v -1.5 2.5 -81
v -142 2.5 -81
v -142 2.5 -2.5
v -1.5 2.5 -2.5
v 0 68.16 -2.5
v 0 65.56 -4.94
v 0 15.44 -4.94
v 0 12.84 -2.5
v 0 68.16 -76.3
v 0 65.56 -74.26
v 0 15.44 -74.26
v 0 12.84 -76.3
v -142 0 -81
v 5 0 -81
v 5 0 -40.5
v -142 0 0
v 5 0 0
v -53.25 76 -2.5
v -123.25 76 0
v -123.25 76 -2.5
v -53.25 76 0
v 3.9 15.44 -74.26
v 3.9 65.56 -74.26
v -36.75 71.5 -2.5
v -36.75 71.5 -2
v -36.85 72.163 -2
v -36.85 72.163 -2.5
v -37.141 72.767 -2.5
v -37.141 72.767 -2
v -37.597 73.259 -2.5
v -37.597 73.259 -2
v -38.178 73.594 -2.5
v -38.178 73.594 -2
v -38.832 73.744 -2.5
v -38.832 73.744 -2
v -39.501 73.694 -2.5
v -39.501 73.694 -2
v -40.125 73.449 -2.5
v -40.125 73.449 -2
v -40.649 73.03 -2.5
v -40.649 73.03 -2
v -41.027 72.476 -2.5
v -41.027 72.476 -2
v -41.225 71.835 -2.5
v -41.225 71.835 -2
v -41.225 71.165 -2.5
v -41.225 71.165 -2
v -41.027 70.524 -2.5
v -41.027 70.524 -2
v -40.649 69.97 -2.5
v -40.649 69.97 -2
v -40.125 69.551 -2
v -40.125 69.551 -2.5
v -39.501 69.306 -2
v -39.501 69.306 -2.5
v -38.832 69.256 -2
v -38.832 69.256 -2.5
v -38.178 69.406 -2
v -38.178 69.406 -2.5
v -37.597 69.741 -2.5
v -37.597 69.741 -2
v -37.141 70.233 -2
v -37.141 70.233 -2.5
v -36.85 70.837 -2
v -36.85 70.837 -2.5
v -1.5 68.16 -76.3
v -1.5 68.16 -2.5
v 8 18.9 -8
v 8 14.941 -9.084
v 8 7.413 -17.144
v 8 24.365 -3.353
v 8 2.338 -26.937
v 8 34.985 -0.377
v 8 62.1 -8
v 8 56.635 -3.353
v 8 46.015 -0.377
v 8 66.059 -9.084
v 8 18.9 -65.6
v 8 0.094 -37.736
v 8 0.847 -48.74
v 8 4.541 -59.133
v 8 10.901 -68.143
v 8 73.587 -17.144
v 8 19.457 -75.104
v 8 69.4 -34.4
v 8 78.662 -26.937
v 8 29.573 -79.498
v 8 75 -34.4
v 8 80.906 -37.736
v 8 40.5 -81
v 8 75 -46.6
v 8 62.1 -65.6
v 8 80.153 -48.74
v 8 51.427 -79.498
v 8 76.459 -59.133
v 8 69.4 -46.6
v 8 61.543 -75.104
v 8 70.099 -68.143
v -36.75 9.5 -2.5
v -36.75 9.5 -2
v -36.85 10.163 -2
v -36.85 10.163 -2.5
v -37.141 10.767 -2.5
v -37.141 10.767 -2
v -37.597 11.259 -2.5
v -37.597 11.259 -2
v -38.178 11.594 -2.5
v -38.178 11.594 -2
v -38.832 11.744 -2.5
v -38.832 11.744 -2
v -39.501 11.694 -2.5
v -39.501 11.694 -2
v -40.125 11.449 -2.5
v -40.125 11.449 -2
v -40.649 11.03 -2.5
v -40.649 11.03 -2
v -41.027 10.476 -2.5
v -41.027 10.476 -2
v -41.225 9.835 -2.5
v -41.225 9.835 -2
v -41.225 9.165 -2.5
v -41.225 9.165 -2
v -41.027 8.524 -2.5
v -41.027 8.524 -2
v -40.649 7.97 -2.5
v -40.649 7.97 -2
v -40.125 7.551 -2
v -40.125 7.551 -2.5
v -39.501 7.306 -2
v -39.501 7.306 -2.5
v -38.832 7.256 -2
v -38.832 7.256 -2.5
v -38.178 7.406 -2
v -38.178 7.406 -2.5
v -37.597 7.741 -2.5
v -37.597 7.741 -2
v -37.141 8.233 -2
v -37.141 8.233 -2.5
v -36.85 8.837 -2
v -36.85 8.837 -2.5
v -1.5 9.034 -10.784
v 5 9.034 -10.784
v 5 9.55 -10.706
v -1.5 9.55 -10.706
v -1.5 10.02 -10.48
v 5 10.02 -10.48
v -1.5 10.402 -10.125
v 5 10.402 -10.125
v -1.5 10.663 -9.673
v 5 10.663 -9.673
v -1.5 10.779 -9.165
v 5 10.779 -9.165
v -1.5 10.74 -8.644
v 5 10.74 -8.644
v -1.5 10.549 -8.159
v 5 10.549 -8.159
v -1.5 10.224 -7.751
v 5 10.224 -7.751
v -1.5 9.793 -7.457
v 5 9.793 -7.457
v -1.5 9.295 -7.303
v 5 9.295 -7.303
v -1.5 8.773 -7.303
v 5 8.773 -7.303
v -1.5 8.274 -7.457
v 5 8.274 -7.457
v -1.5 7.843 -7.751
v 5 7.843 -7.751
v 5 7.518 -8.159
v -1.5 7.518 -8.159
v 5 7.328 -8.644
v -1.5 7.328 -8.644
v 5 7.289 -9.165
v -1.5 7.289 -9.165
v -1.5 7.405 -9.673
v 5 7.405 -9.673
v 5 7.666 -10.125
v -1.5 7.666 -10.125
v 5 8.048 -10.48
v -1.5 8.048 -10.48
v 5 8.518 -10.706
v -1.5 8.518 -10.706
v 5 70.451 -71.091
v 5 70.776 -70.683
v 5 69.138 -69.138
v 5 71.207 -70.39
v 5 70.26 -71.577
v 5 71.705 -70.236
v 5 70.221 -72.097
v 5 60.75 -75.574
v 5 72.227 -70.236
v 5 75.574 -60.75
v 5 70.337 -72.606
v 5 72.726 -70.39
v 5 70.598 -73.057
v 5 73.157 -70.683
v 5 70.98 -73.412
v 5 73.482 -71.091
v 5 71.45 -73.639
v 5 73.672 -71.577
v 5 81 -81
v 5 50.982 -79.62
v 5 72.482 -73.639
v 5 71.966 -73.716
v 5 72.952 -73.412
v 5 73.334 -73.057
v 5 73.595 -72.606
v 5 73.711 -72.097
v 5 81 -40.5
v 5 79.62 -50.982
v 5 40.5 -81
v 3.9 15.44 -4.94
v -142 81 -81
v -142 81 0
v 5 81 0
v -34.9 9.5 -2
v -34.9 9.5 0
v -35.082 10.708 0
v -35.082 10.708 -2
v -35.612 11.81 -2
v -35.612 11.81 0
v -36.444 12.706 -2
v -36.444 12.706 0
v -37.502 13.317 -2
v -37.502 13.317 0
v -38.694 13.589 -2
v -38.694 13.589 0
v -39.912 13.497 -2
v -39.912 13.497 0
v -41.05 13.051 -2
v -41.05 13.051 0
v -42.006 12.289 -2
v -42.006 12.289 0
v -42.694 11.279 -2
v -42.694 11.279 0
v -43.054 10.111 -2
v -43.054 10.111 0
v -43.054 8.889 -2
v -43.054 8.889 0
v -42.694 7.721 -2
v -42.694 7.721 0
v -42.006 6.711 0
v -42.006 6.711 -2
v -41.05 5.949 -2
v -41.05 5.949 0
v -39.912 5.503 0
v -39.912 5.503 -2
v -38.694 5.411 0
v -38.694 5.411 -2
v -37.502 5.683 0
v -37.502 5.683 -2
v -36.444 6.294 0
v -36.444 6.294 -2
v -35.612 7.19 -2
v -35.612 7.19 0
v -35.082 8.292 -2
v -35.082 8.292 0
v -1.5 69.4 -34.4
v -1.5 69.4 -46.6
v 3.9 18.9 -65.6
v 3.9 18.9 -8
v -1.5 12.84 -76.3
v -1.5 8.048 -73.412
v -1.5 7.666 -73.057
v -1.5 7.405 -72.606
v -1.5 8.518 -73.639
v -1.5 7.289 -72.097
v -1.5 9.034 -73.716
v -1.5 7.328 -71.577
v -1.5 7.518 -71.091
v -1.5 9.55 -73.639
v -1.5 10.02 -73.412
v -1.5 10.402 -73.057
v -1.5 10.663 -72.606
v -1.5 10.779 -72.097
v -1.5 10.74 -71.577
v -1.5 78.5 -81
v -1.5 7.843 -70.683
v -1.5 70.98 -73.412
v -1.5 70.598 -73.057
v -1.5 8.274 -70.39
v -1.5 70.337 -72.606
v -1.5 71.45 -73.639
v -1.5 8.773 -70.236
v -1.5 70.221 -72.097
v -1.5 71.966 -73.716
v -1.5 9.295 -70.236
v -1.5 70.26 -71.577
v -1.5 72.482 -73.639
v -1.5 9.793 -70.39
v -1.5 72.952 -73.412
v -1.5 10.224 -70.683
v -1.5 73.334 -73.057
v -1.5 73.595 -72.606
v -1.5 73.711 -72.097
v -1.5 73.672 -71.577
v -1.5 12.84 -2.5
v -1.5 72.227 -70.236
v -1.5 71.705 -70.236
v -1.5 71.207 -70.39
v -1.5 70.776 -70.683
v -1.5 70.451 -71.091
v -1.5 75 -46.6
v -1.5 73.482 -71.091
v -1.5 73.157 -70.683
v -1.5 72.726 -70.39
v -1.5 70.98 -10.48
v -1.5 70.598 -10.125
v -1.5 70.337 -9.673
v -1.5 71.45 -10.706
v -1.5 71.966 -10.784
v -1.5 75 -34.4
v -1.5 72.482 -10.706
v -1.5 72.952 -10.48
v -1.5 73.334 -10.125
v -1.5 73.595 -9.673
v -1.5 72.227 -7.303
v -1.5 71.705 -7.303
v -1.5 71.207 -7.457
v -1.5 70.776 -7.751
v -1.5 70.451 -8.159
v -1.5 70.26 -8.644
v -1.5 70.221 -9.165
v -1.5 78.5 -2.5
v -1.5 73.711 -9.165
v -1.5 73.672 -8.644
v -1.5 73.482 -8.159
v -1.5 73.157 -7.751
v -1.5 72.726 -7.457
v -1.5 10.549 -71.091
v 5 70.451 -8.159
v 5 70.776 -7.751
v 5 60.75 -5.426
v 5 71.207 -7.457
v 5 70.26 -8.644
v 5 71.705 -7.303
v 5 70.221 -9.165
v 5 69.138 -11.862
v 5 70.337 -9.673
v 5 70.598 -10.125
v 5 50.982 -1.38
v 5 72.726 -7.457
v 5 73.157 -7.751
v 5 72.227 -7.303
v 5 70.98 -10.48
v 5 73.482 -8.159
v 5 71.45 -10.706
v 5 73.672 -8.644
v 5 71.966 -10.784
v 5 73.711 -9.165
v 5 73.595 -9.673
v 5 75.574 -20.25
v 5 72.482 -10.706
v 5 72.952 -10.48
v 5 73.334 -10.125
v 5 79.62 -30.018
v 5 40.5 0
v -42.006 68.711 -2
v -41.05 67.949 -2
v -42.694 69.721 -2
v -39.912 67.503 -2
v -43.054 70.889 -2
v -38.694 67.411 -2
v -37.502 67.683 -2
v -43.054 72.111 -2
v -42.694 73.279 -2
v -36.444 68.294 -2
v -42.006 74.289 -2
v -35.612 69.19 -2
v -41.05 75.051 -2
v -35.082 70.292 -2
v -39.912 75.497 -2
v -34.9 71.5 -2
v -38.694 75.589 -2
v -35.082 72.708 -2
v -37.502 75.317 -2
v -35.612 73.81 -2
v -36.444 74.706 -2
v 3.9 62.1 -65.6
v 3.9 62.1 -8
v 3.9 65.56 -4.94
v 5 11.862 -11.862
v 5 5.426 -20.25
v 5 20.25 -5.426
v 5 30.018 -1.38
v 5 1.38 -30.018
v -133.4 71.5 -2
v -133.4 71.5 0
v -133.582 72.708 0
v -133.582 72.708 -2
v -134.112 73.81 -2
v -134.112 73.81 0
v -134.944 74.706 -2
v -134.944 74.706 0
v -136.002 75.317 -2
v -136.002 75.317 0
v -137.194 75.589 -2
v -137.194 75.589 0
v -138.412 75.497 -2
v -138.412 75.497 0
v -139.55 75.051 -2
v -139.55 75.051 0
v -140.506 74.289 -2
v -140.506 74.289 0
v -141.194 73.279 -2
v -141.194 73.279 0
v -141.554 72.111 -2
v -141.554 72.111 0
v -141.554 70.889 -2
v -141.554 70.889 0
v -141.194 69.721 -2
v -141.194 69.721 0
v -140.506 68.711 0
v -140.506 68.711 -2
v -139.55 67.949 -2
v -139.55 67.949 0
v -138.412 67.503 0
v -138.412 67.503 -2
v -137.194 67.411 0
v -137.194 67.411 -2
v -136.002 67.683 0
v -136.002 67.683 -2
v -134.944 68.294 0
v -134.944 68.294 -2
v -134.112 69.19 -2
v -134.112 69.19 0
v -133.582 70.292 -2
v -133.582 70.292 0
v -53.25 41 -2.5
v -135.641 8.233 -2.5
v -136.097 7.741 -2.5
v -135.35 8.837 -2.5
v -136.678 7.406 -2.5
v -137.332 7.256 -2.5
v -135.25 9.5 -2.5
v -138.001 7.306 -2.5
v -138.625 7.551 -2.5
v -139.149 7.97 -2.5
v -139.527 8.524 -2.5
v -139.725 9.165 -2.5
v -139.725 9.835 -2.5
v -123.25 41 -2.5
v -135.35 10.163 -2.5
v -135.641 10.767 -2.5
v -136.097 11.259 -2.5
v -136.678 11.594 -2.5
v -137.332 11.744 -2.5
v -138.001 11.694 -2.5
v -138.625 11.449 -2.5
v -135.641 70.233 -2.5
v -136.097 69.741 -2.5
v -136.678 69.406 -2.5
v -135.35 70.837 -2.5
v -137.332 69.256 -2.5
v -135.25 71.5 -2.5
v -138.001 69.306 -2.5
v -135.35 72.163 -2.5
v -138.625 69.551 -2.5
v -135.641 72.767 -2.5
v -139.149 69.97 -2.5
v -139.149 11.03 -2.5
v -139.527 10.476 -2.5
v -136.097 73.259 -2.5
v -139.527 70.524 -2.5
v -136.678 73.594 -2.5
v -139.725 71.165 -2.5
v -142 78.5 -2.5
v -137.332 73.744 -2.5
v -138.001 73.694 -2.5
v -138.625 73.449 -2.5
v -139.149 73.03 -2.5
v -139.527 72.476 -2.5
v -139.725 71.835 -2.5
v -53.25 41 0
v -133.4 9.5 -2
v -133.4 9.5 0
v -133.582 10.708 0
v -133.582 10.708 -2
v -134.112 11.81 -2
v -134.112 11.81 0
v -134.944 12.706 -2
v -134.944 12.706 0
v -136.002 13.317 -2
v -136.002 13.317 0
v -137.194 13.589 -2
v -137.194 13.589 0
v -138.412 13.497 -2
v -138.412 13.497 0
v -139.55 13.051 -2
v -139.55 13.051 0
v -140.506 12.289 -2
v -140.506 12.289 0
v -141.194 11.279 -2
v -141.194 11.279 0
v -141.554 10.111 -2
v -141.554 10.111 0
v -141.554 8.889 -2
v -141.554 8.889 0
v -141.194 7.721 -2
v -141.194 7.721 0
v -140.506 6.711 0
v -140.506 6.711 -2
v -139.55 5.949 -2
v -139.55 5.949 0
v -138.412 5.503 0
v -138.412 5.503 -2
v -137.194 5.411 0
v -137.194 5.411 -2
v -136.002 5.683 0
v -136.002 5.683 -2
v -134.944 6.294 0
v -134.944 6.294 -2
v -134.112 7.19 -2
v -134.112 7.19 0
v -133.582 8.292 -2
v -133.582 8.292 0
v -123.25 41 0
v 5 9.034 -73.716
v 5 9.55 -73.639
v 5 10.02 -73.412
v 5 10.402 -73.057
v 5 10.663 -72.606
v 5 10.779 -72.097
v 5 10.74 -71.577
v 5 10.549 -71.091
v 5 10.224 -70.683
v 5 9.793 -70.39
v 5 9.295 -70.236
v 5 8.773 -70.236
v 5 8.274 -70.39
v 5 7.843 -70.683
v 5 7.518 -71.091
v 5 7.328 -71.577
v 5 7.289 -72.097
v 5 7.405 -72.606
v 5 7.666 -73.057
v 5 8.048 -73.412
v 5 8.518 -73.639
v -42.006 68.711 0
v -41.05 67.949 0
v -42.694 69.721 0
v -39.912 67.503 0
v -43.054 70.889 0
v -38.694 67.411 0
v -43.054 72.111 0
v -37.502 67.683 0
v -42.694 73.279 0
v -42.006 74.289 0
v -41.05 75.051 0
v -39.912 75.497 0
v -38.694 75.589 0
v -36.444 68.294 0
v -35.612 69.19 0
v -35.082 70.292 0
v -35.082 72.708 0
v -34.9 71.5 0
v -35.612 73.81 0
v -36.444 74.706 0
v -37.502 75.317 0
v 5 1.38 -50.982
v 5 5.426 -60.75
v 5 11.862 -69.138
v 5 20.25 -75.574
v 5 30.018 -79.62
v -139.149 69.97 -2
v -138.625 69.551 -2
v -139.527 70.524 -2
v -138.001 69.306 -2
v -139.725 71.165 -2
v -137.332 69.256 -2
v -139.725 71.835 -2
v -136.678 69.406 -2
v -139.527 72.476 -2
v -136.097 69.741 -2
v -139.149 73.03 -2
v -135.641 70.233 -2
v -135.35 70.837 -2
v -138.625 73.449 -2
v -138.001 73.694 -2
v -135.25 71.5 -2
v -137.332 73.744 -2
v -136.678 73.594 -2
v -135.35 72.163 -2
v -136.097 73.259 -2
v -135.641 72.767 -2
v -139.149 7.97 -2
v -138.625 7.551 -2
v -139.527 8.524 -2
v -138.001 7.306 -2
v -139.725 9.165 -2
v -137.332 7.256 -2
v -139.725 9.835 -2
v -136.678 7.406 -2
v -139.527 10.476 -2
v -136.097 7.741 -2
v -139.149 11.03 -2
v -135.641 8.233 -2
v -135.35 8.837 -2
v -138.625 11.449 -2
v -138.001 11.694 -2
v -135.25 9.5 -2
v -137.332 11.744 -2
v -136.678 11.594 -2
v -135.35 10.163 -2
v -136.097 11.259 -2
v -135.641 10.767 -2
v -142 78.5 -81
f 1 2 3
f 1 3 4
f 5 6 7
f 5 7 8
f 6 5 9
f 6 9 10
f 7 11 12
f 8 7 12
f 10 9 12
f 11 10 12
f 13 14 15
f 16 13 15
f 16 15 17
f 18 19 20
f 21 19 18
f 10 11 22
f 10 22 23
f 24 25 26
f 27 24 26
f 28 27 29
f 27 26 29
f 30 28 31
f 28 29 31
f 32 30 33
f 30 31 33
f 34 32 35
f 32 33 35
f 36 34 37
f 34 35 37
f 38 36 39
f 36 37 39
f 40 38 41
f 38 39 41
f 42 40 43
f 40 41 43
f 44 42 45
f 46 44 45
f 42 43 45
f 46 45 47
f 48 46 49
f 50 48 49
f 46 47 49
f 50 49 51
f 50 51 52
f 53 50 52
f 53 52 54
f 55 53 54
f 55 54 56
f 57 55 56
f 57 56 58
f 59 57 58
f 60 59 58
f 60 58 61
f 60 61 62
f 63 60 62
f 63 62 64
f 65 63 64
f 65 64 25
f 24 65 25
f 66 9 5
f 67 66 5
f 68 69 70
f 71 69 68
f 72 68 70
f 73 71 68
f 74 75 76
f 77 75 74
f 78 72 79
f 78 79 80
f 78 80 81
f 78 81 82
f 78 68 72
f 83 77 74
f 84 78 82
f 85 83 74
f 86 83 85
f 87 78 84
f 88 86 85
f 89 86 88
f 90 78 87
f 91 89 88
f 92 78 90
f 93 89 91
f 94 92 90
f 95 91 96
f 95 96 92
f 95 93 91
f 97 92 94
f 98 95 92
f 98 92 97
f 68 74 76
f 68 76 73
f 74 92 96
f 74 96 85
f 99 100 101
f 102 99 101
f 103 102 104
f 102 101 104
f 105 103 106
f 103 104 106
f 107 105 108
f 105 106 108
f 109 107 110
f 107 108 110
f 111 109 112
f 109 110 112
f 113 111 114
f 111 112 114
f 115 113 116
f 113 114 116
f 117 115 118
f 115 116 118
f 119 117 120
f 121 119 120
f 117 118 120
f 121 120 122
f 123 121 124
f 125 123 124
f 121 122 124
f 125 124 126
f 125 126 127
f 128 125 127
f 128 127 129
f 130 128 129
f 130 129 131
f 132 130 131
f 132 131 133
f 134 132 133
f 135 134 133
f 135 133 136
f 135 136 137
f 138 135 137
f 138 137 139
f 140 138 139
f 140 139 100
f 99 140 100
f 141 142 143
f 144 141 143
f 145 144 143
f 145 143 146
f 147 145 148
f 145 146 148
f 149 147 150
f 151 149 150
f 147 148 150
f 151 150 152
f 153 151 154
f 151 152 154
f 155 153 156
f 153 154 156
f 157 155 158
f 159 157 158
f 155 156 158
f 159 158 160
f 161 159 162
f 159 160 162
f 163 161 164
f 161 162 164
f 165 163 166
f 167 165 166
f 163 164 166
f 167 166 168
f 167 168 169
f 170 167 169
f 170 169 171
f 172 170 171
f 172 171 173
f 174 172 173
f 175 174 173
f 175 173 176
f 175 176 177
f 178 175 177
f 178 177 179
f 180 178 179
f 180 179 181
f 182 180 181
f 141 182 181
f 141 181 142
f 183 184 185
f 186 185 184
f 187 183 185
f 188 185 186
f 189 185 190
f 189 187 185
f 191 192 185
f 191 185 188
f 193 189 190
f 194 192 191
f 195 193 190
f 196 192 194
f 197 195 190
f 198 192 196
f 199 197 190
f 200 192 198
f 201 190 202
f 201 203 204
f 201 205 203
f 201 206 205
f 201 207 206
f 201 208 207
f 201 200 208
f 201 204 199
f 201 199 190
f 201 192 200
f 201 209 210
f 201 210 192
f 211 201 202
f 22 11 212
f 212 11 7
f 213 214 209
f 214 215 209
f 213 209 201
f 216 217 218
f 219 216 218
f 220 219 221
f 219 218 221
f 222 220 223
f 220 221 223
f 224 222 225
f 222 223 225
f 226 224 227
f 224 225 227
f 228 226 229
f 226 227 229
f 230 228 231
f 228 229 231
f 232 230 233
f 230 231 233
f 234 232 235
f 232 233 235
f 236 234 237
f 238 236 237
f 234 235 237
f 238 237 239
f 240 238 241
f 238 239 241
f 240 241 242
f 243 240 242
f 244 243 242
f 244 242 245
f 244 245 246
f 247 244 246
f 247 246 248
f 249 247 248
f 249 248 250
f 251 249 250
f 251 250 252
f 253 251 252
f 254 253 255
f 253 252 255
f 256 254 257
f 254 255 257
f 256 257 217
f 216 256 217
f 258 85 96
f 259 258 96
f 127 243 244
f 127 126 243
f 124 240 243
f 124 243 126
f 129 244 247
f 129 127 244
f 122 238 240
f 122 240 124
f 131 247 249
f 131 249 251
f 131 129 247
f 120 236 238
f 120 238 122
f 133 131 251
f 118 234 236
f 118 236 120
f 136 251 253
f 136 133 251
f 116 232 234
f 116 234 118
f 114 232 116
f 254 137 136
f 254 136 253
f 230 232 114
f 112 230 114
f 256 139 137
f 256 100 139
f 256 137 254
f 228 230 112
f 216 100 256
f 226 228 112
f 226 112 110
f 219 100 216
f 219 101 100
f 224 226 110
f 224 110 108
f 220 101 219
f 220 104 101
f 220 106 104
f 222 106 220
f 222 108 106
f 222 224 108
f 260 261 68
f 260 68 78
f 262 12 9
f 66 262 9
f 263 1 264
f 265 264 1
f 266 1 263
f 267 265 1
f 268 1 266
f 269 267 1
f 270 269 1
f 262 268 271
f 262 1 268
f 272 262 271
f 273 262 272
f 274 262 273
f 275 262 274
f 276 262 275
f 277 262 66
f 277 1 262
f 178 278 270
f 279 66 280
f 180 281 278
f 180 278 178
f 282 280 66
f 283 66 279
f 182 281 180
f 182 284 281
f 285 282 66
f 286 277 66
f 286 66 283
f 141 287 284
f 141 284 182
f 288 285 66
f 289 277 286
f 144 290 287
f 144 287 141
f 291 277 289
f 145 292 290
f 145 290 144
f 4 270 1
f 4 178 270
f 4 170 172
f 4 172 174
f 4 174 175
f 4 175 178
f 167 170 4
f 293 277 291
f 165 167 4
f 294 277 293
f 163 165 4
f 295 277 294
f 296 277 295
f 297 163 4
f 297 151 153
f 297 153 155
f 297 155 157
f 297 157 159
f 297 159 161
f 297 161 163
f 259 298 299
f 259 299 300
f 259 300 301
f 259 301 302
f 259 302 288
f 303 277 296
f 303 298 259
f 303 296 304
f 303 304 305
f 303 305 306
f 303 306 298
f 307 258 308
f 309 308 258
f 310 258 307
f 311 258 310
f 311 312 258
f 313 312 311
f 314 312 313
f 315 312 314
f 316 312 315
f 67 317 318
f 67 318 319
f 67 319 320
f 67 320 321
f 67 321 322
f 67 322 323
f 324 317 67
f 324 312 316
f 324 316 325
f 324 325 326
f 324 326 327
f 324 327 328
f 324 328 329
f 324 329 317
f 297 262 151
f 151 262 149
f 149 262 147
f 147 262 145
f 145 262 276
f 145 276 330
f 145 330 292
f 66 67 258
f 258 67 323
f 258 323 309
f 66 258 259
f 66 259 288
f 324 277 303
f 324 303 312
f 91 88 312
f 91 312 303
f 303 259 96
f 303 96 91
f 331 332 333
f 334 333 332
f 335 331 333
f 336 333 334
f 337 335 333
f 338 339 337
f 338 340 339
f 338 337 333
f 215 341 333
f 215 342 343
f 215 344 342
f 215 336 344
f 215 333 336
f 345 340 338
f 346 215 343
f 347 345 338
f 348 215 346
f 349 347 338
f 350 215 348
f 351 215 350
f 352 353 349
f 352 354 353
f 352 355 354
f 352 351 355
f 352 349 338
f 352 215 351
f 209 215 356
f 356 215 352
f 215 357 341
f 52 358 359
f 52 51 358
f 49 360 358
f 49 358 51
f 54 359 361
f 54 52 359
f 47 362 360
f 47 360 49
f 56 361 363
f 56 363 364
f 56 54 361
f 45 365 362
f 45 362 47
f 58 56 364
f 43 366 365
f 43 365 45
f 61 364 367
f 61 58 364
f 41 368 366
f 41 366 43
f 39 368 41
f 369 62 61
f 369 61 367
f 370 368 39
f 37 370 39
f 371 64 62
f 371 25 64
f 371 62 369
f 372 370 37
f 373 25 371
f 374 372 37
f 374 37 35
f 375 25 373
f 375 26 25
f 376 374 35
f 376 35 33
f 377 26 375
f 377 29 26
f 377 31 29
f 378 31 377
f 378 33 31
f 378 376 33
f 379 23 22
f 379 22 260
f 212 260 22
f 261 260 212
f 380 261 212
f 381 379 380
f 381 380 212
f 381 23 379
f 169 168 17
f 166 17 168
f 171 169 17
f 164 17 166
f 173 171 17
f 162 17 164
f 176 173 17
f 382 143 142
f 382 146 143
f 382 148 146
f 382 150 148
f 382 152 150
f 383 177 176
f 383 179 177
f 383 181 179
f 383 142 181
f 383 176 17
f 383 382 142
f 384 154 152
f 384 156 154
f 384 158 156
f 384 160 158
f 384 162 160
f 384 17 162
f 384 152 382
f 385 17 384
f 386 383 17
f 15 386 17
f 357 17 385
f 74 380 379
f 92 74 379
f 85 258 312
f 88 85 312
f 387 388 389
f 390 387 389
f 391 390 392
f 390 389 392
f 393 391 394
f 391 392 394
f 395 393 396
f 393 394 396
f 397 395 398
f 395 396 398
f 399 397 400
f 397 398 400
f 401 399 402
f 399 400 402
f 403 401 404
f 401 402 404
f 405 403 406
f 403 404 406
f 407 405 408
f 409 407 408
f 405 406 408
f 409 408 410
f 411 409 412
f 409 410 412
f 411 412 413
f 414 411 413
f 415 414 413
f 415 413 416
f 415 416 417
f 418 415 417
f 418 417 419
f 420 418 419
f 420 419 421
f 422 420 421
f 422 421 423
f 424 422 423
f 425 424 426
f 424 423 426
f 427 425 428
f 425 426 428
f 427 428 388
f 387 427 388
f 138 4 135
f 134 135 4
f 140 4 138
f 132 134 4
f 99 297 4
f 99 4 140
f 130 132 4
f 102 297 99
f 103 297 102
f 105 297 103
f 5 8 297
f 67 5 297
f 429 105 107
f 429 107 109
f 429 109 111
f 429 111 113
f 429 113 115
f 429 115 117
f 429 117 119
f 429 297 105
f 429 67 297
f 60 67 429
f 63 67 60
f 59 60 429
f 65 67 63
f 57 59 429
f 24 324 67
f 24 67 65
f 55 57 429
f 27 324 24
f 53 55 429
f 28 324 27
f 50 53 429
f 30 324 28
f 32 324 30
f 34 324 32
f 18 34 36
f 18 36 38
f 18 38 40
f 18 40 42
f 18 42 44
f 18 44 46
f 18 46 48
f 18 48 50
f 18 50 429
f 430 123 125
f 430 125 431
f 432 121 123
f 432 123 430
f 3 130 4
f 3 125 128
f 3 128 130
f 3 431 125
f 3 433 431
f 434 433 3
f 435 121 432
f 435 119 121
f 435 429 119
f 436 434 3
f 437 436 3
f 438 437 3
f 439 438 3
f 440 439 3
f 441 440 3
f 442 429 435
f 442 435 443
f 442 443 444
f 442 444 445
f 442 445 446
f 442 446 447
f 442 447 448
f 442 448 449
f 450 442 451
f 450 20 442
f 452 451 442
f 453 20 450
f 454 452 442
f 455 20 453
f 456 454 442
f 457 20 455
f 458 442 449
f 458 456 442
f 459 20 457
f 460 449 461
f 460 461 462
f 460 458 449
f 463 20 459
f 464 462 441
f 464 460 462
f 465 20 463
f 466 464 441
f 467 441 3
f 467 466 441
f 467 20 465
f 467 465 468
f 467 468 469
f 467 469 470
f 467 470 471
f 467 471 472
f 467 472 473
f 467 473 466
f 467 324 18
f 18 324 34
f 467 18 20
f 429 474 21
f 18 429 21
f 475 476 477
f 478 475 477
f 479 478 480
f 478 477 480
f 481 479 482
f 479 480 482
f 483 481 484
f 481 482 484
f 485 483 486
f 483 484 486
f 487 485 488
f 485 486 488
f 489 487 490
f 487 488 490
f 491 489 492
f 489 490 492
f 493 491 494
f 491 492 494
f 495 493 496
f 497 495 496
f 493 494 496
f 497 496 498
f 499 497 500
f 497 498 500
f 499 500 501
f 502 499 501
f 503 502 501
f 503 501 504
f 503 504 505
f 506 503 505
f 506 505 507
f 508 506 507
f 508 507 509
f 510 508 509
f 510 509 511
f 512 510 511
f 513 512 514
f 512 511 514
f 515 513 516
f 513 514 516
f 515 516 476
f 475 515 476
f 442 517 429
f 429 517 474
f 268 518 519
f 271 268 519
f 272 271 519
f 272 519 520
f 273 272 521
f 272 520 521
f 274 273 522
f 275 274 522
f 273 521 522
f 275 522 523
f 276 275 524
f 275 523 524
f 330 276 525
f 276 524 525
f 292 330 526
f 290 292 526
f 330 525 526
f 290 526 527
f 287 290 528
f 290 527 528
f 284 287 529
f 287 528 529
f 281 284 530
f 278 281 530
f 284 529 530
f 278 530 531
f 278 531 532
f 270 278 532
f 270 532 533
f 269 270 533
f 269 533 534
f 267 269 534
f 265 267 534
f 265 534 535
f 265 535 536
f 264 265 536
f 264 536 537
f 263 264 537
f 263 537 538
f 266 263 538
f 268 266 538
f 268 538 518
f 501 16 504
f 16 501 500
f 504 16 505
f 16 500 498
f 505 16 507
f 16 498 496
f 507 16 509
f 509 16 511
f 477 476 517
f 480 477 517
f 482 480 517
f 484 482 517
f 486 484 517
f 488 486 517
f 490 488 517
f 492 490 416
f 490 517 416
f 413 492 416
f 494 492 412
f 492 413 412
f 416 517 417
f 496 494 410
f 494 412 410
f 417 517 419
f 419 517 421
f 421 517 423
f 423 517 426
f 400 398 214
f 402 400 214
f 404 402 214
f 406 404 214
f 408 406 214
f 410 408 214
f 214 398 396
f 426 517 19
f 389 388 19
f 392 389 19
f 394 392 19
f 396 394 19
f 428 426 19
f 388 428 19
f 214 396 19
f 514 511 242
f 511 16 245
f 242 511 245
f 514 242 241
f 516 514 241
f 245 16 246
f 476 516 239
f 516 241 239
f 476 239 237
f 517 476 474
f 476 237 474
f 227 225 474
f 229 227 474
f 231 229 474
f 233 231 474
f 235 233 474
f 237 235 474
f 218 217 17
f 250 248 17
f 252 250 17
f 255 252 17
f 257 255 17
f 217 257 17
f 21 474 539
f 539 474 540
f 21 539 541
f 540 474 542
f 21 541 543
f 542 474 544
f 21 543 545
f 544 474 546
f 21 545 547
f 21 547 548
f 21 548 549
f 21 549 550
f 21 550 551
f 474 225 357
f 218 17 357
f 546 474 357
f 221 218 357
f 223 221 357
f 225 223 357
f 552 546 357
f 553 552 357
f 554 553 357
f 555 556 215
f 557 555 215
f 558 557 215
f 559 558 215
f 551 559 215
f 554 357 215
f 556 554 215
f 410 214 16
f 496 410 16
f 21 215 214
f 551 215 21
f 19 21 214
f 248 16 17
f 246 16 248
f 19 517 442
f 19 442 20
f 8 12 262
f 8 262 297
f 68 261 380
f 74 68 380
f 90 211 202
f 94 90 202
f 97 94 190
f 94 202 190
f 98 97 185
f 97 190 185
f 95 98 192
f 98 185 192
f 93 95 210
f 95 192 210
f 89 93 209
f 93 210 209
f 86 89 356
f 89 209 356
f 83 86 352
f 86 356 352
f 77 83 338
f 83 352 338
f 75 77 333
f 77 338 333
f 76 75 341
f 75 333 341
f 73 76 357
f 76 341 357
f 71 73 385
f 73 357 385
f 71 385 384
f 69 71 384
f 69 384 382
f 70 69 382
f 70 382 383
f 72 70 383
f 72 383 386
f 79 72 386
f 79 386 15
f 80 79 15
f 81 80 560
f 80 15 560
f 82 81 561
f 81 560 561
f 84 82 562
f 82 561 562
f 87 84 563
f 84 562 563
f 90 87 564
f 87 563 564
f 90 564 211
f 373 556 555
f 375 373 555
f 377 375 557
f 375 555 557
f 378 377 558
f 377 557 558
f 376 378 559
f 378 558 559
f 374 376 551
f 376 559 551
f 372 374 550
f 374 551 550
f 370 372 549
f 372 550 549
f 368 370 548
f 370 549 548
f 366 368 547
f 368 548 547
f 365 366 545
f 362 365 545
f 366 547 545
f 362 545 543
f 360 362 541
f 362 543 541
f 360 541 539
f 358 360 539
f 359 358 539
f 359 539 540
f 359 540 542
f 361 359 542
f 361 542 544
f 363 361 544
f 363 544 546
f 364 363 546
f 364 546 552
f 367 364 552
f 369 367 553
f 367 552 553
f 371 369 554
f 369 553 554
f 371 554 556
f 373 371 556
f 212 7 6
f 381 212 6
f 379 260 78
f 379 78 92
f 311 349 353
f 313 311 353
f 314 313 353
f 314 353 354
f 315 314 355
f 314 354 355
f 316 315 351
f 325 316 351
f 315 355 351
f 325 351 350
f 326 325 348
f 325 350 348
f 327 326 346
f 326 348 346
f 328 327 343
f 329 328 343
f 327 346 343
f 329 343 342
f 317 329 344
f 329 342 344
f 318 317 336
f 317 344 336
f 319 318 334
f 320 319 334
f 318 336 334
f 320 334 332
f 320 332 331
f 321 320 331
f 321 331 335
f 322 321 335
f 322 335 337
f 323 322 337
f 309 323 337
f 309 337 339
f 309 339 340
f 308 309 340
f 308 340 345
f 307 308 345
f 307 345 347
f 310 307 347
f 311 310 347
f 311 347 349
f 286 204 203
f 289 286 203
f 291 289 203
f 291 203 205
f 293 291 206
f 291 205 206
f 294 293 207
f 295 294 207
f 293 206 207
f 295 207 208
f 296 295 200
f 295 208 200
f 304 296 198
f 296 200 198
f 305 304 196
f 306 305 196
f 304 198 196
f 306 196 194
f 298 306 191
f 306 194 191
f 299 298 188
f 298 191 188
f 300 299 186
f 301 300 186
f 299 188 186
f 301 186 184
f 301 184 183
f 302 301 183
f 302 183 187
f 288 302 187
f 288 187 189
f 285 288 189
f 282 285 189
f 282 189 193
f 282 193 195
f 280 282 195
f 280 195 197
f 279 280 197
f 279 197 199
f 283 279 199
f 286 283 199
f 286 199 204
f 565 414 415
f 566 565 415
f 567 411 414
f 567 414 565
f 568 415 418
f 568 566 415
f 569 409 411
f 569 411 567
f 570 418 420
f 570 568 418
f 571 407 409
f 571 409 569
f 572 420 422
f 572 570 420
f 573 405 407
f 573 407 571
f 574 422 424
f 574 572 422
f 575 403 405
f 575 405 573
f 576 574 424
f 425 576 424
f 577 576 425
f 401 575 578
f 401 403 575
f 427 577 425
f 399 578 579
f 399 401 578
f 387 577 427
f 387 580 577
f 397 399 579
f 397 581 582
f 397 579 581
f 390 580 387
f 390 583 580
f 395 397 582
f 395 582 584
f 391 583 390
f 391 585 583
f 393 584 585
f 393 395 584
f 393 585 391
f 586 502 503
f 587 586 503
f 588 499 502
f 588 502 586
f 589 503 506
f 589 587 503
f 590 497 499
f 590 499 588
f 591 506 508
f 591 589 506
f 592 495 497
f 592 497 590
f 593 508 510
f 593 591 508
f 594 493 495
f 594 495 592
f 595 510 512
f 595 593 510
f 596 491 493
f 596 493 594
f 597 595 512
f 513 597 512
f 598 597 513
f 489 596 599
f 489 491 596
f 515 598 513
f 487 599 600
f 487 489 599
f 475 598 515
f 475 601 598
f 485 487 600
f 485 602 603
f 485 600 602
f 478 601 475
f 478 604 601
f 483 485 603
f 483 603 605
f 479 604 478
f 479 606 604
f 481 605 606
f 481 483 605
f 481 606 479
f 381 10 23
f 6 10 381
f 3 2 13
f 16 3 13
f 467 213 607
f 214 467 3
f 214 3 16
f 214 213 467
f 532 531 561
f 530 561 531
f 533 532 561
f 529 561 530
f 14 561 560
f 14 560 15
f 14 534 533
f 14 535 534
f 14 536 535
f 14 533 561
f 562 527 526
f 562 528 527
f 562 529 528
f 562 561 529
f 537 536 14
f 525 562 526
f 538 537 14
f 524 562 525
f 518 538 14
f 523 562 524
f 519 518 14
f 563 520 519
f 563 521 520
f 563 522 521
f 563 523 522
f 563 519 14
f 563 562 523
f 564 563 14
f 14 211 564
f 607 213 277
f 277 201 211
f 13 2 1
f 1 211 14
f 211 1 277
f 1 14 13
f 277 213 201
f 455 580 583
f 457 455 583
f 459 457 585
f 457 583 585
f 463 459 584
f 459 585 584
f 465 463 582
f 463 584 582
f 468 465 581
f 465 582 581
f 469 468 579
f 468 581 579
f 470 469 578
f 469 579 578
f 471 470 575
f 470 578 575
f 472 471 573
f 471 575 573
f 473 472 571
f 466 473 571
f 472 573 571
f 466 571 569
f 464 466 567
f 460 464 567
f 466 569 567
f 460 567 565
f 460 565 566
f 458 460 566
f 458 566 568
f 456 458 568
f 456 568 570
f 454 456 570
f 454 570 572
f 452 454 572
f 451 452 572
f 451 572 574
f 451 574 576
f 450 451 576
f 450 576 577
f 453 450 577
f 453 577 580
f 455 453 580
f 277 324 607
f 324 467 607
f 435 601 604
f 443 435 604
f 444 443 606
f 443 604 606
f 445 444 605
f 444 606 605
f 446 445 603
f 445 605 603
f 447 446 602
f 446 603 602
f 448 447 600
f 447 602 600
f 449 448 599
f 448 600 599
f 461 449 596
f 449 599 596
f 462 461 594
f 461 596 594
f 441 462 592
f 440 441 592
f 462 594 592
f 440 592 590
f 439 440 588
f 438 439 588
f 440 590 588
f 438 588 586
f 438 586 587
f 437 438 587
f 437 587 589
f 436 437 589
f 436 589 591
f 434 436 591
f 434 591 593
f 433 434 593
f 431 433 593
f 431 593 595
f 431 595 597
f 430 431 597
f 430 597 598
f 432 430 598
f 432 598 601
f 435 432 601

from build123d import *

# Parameters (mm, degrees)
SZKIC1_W                    = 57.6
SZKIC1_H                    = 43.2
DODANIE_WYCI_GNI_CIE1_DEPTH = 8
DODANIE_WYCI_GNI_CIE2_DEPTH = 5
SZKIC2_W                    = 69.32
SZKIC2_H                    = 50.12
SZKIC2_W_2                  = 57.6
SZKIC2_H_2                  = 43.2
WYTNIJ_WYCI_GNI_CIE1_DEPTH  = 3.9
SZKIC2_4_W                  = 81
SZKIC2_4_H                  = 81
SZKIC2_4_W_2                = 73.3
SZKIC2_4_H_2                = 55.32
DODANIE_WYCI_GNI_CIE3_DEPTH = 2
DODANIE_WYCI_GNI_CIE4_DEPTH = 140
WYTNIJ_WYCI_GNI_CIE2_REACH  = 184.445
SZKIC5_R                    = 2.25
SZKIC6_R                    = 4.1
WYTNIJ_WYCI_GNI_CIE3_DEPTH  = 2
WYTNIJ_WYCI_GNI_CIE4_REACH  = 184.445
SZKIC7_W                    = 70
SZKIC7_H                    = 35
WYTNIJ_WYCI_GNI_CIE5_REACH  = 188.363
SZKIC8_R                    = 1.75
WYTNIJ_WYCI_GNI_CIE6_REACH  = 190.738
SZKIC9_W                    = 12.2
SZKIC9_H                    = 5.6
SZKIC10_W                   = 140
SZKIC10_H                   = 78
WYTNIJ_WYCI_GNI_CIE7_DEPTH  = 0.5
SZKIC11_W                   = 140
SZKIC11_H                   = 78
WYTNIJ_WYCI_GNI_CIE8_DEPTH  = 0.5
WYTNIJ_WYCI_GNI_CIE9_DEPTH  = 0.5
WYTNIJ_WYCI_GNI_CIE10_DEPTH = 0.5


with BuildPart() as part:
    # Szkic1 → Dodanie-wyciągnięcie1 (new body)
    with BuildSketch(Plane(origin=(0, 0, 0), x_dir=(0, 0, -1), z_dir=(1, 0, 0))):
        with BuildLine():
            ThreePointArc((81, 40.5), (69.137824638, 69.137824638), (40.5, 81))
            ThreePointArc((40.5, 81), (11.862175362, 69.137824638), (0, 40.5))
            ThreePointArc((0, 40.5), (11.862175362, 11.862175362), (40.5, 0))
            ThreePointArc((40.5, 0), (69.137824638, 11.862175362), (81, 40.5))
        make_face()
        with Locations((36.8, 40.5)):
            Rectangle(SZKIC1_W, SZKIC1_H, mode=Mode.SUBTRACT)
    extrude(amount=DODANIE_WYCI_GNI_CIE1_DEPTH)

    # Szkic1<3> → Dodanie-wyciągnięcie2 (add)
    with BuildSketch(Plane(origin=(0, 0, 0), x_dir=(0, 0, -1), z_dir=(1, 0, 0))):
        with BuildLine():
            Line((40.5, 81), (0, 81))
            Line((0, 81), (0, 40.5))
            ThreePointArc((0, 40.5), (11.862175362, 69.137824638), (40.5, 81))
        make_face()
        with BuildLine():
            Line((81, 81), (40.5, 81))
            ThreePointArc((40.5, 81), (69.137824638, 69.137824638), (81, 40.5))
            Line((81, 40.5), (81, 81))
        make_face()
        with BuildLine():
            ThreePointArc((40.5, 0), (11.862175362, 11.862175362), (0, 40.5))
            Line((0, 40.5), (0, 0))
            Line((0, 0), (40.5, 0))
        make_face()
        with BuildLine():
            Line((81, 0), (81, 40.5))
            ThreePointArc((81, 40.5), (69.137824638, 11.862175362), (40.5, 0))
            Line((40.5, 0), (81, 0))
        make_face()
    extrude(amount=DODANIE_WYCI_GNI_CIE2_DEPTH)

    # Szkic2 → Wytnij-wyciągnięcie1 (cut)
    with BuildSketch(Plane.ZY):
        with Locations((-39.6, 40.5)):
            Rectangle(SZKIC2_W, SZKIC2_H)
        with Locations((-36.8, 40.5)):
            Rectangle(SZKIC2_W_2, SZKIC2_H_2, mode=Mode.SUBTRACT)
    extrude(amount=-WYTNIJ_WYCI_GNI_CIE1_DEPTH, mode=Mode.SUBTRACT)

    # Szkic2<4> → Dodanie-wyciągnięcie3 (add)
    with BuildSketch(Plane.ZY):
        with Locations((-40.5, 40.5)):
            Rectangle(SZKIC2_4_W, SZKIC2_4_H)
        with Locations((-39.65, 40.5)):
            Rectangle(SZKIC2_4_W_2, SZKIC2_4_H_2, mode=Mode.SUBTRACT)
    extrude(amount=DODANIE_WYCI_GNI_CIE3_DEPTH)

    # Szkic3 → Dodanie-wyciągnięcie4 (add)
    with BuildSketch(Plane.ZY.offset(2)):
        Polygon((-81, 0), (0, 0), (0, 81), (-81, 81), (-81, 78), (-3, 78), (-3, 3), (-81, 3), align=None)
    extrude(amount=DODANIE_WYCI_GNI_CIE4_DEPTH)

    # Szkic5 → Wytnij-wyciągnięcie2 (cut, up to next)
    with BuildSketch(Plane.XY, mode=Mode.PRIVATE) as wytnij_wyci_gni_cie2_sk1:
        with Locations((-137.5, 71.5)):
            Circle(SZKIC5_R)
    wytnij_wyci_gni_cie2_tool1 = extrude(wytnij_wyci_gni_cie2_sk1.sketch, amount=-WYTNIJ_WYCI_GNI_CIE2_REACH, mode=Mode.PRIVATE) & part.part
    # Szkic5 → Wytnij-wyciągnięcie2 (cut, up to next)
    with BuildSketch(Plane.XY, mode=Mode.PRIVATE) as wytnij_wyci_gni_cie2_sk2:
        with Locations((-39, 71.5)):
            Circle(SZKIC5_R)
    wytnij_wyci_gni_cie2_tool2 = extrude(wytnij_wyci_gni_cie2_sk2.sketch, amount=-WYTNIJ_WYCI_GNI_CIE2_REACH, mode=Mode.PRIVATE) & part.part
    # Szkic5 → Wytnij-wyciągnięcie2 (cut, up to next)
    with BuildSketch(Plane.XY, mode=Mode.PRIVATE) as wytnij_wyci_gni_cie2_sk3:
        with Locations((-137.5, 9.5)):
            Circle(SZKIC5_R)
    wytnij_wyci_gni_cie2_tool3 = extrude(wytnij_wyci_gni_cie2_sk3.sketch, amount=-WYTNIJ_WYCI_GNI_CIE2_REACH, mode=Mode.PRIVATE) & part.part
    # Szkic5 → Wytnij-wyciągnięcie2 (cut, up to next)
    with BuildSketch(Plane.XY, mode=Mode.PRIVATE) as wytnij_wyci_gni_cie2_sk4:
        with Locations((-39, 9.5)):
            Circle(SZKIC5_R)
    wytnij_wyci_gni_cie2_tool4 = extrude(wytnij_wyci_gni_cie2_sk4.sketch, amount=-WYTNIJ_WYCI_GNI_CIE2_REACH, mode=Mode.PRIVATE) & part.part
    add(wytnij_wyci_gni_cie2_tool1.solids().sort_by_distance((-137.5, 71.5, 0))[0], mode=Mode.SUBTRACT)
    add(wytnij_wyci_gni_cie2_tool2.solids().sort_by_distance((-39, 71.5, 0))[0], mode=Mode.SUBTRACT)
    add(wytnij_wyci_gni_cie2_tool3.solids().sort_by_distance((-137.5, 9.5, 0))[0], mode=Mode.SUBTRACT)
    add(wytnij_wyci_gni_cie2_tool4.solids().sort_by_distance((-39, 9.5, 0))[0], mode=Mode.SUBTRACT)

    # Szkic6 → Wytnij-wyciągnięcie3 (cut)
    with BuildSketch(Plane.XY):
        with Locations((-137.5, 71.5)):
            Circle(SZKIC6_R)
        with Locations((-39, 71.5)):
            Circle(SZKIC6_R)
        with Locations((-39, 9.5)):
            Circle(SZKIC6_R)
        with Locations((-137.5, 9.5)):
            Circle(SZKIC6_R)
    extrude(amount=-WYTNIJ_WYCI_GNI_CIE3_DEPTH, mode=Mode.SUBTRACT)

    # Szkic7 → Wytnij-wyciągnięcie4 (cut, up to next)
    with BuildSketch(Plane.XY, mode=Mode.PRIVATE) as wytnij_wyci_gni_cie4_sk1:
        with Locations((-88.25, 58.5)):
            Rectangle(SZKIC7_W, SZKIC7_H)
    wytnij_wyci_gni_cie4_tool1 = extrude(wytnij_wyci_gni_cie4_sk1.sketch, amount=-WYTNIJ_WYCI_GNI_CIE4_REACH, mode=Mode.PRIVATE) & part.part
    add(wytnij_wyci_gni_cie4_tool1.solids().sort_by_distance((-88.25, 58.5, 0))[0], mode=Mode.SUBTRACT)

    # Szkic8 → Wytnij-wyciągnięcie5 (cut, up to next)
    with BuildSketch(Plane(origin=(5, 0, 0), x_dir=(0, 0, -1), z_dir=(1, 0, 0)), mode=Mode.PRIVATE) as wytnij_wyci_gni_cie5_sk1:
        with Locations((9.033748237, 71.966251763)):
            Circle(SZKIC8_R)
    wytnij_wyci_gni_cie5_tool1 = extrude(wytnij_wyci_gni_cie5_sk1.sketch, amount=-WYTNIJ_WYCI_GNI_CIE5_REACH, mode=Mode.PRIVATE) & part.part
    # Szkic8 → Wytnij-wyciągnięcie5 (cut, up to next)
    with BuildSketch(Plane(origin=(5, 0, 0), x_dir=(0, 0, -1), z_dir=(1, 0, 0)), mode=Mode.PRIVATE) as wytnij_wyci_gni_cie5_sk2:
        with Locations((71.966251763, 71.966251763)):
            Circle(SZKIC8_R)
    wytnij_wyci_gni_cie5_tool2 = extrude(wytnij_wyci_gni_cie5_sk2.sketch, amount=-WYTNIJ_WYCI_GNI_CIE5_REACH, mode=Mode.PRIVATE) & part.part
    # Szkic8 → Wytnij-wyciągnięcie5 (cut, up to next)
    with BuildSketch(Plane(origin=(5, 0, 0), x_dir=(0, 0, -1), z_dir=(1, 0, 0)), mode=Mode.PRIVATE) as wytnij_wyci_gni_cie5_sk3:
        with Locations((71.966251763, 9.033748237)):
            Circle(SZKIC8_R)
    wytnij_wyci_gni_cie5_tool3 = extrude(wytnij_wyci_gni_cie5_sk3.sketch, amount=-WYTNIJ_WYCI_GNI_CIE5_REACH, mode=Mode.PRIVATE) & part.part
    # Szkic8 → Wytnij-wyciągnięcie5 (cut, up to next)
    with BuildSketch(Plane(origin=(5, 0, 0), x_dir=(0, 0, -1), z_dir=(1, 0, 0)), mode=Mode.PRIVATE) as wytnij_wyci_gni_cie5_sk4:
        with Locations((9.033748237, 9.033748237)):
            Circle(SZKIC8_R)
    wytnij_wyci_gni_cie5_tool4 = extrude(wytnij_wyci_gni_cie5_sk4.sketch, amount=-WYTNIJ_WYCI_GNI_CIE5_REACH, mode=Mode.PRIVATE) & part.part
    add(wytnij_wyci_gni_cie5_tool1.solids().sort_by_distance((5, 71.966252, -9.033748))[0], mode=Mode.SUBTRACT)
    add(wytnij_wyci_gni_cie5_tool2.solids().sort_by_distance((5, 71.966252, -71.966252))[0], mode=Mode.SUBTRACT)
    add(wytnij_wyci_gni_cie5_tool3.solids().sort_by_distance((5, 9.033748, -71.966252))[0], mode=Mode.SUBTRACT)
    add(wytnij_wyci_gni_cie5_tool4.solids().sort_by_distance((5, 9.033748, -9.033748))[0], mode=Mode.SUBTRACT)

    # Szkic9 → Wytnij-wyciągnięcie6 (cut, up to next)
    with BuildSketch(Plane(origin=(8, 0, 0), x_dir=(0, 0, -1), z_dir=(1, 0, 0)), mode=Mode.PRIVATE) as wytnij_wyci_gni_cie6_sk1:
        with Locations((40.5, 72.2)):
            Rectangle(SZKIC9_W, SZKIC9_H)
    wytnij_wyci_gni_cie6_tool1 = extrude(wytnij_wyci_gni_cie6_sk1.sketch, amount=-WYTNIJ_WYCI_GNI_CIE6_REACH, mode=Mode.PRIVATE) & part.part
    add(wytnij_wyci_gni_cie6_tool1.solids().sort_by_distance((8, 72.2, -40.5))[0], mode=Mode.SUBTRACT)

    # Szkic10 → Wytnij-wyciągnięcie7 (cut)
    with BuildSketch(Plane.XZ.offset(-78)):
        with Locations((-72, -42)):
            Rectangle(SZKIC10_W, SZKIC10_H)
    extrude(amount=-WYTNIJ_WYCI_GNI_CIE7_DEPTH, mode=Mode.SUBTRACT)

    # Szkic11 → Wytnij-wyciągnięcie8 (cut)
    with BuildSketch(Plane(origin=(0, 3, 0), x_dir=(1, 0, 0), z_dir=(0, 1, 0))):
        with Locations((-72, 42)):
            Rectangle(SZKIC11_W, SZKIC11_H)
    extrude(amount=-WYTNIJ_WYCI_GNI_CIE8_DEPTH, mode=Mode.SUBTRACT)

    # Szkic12 → Wytnij-wyciągnięcie9 (cut)
    with BuildSketch(Plane.ZY.offset(2)):
        Polygon((-81, 78.5), (-81, 2.5), (-3, 2.5), (-3, 12.84), (-76.3, 12.84), (-76.3, 68.16), (-3, 68.16), (-3, 78.5), align=None)
    extrude(amount=-WYTNIJ_WYCI_GNI_CIE9_DEPTH, mode=Mode.SUBTRACT)

    # Szkic13 → Wytnij-wyciągnięcie10 (cut)
    with BuildSketch(Plane(origin=(0, 0, -3), x_dir=(-1, 0, 0), z_dir=(0, 0, -1))):
        Polygon((1.5, 78.5), (1.5, 68.16), (0, 68.16), (0, 12.84), (1.5, 12.84), (1.5, 2.5), (142, 2.5), (142, 78.5), align=None)
    extrude(amount=-WYTNIJ_WYCI_GNI_CIE10_DEPTH, mode=Mode.SUBTRACT)


solid = part.part
